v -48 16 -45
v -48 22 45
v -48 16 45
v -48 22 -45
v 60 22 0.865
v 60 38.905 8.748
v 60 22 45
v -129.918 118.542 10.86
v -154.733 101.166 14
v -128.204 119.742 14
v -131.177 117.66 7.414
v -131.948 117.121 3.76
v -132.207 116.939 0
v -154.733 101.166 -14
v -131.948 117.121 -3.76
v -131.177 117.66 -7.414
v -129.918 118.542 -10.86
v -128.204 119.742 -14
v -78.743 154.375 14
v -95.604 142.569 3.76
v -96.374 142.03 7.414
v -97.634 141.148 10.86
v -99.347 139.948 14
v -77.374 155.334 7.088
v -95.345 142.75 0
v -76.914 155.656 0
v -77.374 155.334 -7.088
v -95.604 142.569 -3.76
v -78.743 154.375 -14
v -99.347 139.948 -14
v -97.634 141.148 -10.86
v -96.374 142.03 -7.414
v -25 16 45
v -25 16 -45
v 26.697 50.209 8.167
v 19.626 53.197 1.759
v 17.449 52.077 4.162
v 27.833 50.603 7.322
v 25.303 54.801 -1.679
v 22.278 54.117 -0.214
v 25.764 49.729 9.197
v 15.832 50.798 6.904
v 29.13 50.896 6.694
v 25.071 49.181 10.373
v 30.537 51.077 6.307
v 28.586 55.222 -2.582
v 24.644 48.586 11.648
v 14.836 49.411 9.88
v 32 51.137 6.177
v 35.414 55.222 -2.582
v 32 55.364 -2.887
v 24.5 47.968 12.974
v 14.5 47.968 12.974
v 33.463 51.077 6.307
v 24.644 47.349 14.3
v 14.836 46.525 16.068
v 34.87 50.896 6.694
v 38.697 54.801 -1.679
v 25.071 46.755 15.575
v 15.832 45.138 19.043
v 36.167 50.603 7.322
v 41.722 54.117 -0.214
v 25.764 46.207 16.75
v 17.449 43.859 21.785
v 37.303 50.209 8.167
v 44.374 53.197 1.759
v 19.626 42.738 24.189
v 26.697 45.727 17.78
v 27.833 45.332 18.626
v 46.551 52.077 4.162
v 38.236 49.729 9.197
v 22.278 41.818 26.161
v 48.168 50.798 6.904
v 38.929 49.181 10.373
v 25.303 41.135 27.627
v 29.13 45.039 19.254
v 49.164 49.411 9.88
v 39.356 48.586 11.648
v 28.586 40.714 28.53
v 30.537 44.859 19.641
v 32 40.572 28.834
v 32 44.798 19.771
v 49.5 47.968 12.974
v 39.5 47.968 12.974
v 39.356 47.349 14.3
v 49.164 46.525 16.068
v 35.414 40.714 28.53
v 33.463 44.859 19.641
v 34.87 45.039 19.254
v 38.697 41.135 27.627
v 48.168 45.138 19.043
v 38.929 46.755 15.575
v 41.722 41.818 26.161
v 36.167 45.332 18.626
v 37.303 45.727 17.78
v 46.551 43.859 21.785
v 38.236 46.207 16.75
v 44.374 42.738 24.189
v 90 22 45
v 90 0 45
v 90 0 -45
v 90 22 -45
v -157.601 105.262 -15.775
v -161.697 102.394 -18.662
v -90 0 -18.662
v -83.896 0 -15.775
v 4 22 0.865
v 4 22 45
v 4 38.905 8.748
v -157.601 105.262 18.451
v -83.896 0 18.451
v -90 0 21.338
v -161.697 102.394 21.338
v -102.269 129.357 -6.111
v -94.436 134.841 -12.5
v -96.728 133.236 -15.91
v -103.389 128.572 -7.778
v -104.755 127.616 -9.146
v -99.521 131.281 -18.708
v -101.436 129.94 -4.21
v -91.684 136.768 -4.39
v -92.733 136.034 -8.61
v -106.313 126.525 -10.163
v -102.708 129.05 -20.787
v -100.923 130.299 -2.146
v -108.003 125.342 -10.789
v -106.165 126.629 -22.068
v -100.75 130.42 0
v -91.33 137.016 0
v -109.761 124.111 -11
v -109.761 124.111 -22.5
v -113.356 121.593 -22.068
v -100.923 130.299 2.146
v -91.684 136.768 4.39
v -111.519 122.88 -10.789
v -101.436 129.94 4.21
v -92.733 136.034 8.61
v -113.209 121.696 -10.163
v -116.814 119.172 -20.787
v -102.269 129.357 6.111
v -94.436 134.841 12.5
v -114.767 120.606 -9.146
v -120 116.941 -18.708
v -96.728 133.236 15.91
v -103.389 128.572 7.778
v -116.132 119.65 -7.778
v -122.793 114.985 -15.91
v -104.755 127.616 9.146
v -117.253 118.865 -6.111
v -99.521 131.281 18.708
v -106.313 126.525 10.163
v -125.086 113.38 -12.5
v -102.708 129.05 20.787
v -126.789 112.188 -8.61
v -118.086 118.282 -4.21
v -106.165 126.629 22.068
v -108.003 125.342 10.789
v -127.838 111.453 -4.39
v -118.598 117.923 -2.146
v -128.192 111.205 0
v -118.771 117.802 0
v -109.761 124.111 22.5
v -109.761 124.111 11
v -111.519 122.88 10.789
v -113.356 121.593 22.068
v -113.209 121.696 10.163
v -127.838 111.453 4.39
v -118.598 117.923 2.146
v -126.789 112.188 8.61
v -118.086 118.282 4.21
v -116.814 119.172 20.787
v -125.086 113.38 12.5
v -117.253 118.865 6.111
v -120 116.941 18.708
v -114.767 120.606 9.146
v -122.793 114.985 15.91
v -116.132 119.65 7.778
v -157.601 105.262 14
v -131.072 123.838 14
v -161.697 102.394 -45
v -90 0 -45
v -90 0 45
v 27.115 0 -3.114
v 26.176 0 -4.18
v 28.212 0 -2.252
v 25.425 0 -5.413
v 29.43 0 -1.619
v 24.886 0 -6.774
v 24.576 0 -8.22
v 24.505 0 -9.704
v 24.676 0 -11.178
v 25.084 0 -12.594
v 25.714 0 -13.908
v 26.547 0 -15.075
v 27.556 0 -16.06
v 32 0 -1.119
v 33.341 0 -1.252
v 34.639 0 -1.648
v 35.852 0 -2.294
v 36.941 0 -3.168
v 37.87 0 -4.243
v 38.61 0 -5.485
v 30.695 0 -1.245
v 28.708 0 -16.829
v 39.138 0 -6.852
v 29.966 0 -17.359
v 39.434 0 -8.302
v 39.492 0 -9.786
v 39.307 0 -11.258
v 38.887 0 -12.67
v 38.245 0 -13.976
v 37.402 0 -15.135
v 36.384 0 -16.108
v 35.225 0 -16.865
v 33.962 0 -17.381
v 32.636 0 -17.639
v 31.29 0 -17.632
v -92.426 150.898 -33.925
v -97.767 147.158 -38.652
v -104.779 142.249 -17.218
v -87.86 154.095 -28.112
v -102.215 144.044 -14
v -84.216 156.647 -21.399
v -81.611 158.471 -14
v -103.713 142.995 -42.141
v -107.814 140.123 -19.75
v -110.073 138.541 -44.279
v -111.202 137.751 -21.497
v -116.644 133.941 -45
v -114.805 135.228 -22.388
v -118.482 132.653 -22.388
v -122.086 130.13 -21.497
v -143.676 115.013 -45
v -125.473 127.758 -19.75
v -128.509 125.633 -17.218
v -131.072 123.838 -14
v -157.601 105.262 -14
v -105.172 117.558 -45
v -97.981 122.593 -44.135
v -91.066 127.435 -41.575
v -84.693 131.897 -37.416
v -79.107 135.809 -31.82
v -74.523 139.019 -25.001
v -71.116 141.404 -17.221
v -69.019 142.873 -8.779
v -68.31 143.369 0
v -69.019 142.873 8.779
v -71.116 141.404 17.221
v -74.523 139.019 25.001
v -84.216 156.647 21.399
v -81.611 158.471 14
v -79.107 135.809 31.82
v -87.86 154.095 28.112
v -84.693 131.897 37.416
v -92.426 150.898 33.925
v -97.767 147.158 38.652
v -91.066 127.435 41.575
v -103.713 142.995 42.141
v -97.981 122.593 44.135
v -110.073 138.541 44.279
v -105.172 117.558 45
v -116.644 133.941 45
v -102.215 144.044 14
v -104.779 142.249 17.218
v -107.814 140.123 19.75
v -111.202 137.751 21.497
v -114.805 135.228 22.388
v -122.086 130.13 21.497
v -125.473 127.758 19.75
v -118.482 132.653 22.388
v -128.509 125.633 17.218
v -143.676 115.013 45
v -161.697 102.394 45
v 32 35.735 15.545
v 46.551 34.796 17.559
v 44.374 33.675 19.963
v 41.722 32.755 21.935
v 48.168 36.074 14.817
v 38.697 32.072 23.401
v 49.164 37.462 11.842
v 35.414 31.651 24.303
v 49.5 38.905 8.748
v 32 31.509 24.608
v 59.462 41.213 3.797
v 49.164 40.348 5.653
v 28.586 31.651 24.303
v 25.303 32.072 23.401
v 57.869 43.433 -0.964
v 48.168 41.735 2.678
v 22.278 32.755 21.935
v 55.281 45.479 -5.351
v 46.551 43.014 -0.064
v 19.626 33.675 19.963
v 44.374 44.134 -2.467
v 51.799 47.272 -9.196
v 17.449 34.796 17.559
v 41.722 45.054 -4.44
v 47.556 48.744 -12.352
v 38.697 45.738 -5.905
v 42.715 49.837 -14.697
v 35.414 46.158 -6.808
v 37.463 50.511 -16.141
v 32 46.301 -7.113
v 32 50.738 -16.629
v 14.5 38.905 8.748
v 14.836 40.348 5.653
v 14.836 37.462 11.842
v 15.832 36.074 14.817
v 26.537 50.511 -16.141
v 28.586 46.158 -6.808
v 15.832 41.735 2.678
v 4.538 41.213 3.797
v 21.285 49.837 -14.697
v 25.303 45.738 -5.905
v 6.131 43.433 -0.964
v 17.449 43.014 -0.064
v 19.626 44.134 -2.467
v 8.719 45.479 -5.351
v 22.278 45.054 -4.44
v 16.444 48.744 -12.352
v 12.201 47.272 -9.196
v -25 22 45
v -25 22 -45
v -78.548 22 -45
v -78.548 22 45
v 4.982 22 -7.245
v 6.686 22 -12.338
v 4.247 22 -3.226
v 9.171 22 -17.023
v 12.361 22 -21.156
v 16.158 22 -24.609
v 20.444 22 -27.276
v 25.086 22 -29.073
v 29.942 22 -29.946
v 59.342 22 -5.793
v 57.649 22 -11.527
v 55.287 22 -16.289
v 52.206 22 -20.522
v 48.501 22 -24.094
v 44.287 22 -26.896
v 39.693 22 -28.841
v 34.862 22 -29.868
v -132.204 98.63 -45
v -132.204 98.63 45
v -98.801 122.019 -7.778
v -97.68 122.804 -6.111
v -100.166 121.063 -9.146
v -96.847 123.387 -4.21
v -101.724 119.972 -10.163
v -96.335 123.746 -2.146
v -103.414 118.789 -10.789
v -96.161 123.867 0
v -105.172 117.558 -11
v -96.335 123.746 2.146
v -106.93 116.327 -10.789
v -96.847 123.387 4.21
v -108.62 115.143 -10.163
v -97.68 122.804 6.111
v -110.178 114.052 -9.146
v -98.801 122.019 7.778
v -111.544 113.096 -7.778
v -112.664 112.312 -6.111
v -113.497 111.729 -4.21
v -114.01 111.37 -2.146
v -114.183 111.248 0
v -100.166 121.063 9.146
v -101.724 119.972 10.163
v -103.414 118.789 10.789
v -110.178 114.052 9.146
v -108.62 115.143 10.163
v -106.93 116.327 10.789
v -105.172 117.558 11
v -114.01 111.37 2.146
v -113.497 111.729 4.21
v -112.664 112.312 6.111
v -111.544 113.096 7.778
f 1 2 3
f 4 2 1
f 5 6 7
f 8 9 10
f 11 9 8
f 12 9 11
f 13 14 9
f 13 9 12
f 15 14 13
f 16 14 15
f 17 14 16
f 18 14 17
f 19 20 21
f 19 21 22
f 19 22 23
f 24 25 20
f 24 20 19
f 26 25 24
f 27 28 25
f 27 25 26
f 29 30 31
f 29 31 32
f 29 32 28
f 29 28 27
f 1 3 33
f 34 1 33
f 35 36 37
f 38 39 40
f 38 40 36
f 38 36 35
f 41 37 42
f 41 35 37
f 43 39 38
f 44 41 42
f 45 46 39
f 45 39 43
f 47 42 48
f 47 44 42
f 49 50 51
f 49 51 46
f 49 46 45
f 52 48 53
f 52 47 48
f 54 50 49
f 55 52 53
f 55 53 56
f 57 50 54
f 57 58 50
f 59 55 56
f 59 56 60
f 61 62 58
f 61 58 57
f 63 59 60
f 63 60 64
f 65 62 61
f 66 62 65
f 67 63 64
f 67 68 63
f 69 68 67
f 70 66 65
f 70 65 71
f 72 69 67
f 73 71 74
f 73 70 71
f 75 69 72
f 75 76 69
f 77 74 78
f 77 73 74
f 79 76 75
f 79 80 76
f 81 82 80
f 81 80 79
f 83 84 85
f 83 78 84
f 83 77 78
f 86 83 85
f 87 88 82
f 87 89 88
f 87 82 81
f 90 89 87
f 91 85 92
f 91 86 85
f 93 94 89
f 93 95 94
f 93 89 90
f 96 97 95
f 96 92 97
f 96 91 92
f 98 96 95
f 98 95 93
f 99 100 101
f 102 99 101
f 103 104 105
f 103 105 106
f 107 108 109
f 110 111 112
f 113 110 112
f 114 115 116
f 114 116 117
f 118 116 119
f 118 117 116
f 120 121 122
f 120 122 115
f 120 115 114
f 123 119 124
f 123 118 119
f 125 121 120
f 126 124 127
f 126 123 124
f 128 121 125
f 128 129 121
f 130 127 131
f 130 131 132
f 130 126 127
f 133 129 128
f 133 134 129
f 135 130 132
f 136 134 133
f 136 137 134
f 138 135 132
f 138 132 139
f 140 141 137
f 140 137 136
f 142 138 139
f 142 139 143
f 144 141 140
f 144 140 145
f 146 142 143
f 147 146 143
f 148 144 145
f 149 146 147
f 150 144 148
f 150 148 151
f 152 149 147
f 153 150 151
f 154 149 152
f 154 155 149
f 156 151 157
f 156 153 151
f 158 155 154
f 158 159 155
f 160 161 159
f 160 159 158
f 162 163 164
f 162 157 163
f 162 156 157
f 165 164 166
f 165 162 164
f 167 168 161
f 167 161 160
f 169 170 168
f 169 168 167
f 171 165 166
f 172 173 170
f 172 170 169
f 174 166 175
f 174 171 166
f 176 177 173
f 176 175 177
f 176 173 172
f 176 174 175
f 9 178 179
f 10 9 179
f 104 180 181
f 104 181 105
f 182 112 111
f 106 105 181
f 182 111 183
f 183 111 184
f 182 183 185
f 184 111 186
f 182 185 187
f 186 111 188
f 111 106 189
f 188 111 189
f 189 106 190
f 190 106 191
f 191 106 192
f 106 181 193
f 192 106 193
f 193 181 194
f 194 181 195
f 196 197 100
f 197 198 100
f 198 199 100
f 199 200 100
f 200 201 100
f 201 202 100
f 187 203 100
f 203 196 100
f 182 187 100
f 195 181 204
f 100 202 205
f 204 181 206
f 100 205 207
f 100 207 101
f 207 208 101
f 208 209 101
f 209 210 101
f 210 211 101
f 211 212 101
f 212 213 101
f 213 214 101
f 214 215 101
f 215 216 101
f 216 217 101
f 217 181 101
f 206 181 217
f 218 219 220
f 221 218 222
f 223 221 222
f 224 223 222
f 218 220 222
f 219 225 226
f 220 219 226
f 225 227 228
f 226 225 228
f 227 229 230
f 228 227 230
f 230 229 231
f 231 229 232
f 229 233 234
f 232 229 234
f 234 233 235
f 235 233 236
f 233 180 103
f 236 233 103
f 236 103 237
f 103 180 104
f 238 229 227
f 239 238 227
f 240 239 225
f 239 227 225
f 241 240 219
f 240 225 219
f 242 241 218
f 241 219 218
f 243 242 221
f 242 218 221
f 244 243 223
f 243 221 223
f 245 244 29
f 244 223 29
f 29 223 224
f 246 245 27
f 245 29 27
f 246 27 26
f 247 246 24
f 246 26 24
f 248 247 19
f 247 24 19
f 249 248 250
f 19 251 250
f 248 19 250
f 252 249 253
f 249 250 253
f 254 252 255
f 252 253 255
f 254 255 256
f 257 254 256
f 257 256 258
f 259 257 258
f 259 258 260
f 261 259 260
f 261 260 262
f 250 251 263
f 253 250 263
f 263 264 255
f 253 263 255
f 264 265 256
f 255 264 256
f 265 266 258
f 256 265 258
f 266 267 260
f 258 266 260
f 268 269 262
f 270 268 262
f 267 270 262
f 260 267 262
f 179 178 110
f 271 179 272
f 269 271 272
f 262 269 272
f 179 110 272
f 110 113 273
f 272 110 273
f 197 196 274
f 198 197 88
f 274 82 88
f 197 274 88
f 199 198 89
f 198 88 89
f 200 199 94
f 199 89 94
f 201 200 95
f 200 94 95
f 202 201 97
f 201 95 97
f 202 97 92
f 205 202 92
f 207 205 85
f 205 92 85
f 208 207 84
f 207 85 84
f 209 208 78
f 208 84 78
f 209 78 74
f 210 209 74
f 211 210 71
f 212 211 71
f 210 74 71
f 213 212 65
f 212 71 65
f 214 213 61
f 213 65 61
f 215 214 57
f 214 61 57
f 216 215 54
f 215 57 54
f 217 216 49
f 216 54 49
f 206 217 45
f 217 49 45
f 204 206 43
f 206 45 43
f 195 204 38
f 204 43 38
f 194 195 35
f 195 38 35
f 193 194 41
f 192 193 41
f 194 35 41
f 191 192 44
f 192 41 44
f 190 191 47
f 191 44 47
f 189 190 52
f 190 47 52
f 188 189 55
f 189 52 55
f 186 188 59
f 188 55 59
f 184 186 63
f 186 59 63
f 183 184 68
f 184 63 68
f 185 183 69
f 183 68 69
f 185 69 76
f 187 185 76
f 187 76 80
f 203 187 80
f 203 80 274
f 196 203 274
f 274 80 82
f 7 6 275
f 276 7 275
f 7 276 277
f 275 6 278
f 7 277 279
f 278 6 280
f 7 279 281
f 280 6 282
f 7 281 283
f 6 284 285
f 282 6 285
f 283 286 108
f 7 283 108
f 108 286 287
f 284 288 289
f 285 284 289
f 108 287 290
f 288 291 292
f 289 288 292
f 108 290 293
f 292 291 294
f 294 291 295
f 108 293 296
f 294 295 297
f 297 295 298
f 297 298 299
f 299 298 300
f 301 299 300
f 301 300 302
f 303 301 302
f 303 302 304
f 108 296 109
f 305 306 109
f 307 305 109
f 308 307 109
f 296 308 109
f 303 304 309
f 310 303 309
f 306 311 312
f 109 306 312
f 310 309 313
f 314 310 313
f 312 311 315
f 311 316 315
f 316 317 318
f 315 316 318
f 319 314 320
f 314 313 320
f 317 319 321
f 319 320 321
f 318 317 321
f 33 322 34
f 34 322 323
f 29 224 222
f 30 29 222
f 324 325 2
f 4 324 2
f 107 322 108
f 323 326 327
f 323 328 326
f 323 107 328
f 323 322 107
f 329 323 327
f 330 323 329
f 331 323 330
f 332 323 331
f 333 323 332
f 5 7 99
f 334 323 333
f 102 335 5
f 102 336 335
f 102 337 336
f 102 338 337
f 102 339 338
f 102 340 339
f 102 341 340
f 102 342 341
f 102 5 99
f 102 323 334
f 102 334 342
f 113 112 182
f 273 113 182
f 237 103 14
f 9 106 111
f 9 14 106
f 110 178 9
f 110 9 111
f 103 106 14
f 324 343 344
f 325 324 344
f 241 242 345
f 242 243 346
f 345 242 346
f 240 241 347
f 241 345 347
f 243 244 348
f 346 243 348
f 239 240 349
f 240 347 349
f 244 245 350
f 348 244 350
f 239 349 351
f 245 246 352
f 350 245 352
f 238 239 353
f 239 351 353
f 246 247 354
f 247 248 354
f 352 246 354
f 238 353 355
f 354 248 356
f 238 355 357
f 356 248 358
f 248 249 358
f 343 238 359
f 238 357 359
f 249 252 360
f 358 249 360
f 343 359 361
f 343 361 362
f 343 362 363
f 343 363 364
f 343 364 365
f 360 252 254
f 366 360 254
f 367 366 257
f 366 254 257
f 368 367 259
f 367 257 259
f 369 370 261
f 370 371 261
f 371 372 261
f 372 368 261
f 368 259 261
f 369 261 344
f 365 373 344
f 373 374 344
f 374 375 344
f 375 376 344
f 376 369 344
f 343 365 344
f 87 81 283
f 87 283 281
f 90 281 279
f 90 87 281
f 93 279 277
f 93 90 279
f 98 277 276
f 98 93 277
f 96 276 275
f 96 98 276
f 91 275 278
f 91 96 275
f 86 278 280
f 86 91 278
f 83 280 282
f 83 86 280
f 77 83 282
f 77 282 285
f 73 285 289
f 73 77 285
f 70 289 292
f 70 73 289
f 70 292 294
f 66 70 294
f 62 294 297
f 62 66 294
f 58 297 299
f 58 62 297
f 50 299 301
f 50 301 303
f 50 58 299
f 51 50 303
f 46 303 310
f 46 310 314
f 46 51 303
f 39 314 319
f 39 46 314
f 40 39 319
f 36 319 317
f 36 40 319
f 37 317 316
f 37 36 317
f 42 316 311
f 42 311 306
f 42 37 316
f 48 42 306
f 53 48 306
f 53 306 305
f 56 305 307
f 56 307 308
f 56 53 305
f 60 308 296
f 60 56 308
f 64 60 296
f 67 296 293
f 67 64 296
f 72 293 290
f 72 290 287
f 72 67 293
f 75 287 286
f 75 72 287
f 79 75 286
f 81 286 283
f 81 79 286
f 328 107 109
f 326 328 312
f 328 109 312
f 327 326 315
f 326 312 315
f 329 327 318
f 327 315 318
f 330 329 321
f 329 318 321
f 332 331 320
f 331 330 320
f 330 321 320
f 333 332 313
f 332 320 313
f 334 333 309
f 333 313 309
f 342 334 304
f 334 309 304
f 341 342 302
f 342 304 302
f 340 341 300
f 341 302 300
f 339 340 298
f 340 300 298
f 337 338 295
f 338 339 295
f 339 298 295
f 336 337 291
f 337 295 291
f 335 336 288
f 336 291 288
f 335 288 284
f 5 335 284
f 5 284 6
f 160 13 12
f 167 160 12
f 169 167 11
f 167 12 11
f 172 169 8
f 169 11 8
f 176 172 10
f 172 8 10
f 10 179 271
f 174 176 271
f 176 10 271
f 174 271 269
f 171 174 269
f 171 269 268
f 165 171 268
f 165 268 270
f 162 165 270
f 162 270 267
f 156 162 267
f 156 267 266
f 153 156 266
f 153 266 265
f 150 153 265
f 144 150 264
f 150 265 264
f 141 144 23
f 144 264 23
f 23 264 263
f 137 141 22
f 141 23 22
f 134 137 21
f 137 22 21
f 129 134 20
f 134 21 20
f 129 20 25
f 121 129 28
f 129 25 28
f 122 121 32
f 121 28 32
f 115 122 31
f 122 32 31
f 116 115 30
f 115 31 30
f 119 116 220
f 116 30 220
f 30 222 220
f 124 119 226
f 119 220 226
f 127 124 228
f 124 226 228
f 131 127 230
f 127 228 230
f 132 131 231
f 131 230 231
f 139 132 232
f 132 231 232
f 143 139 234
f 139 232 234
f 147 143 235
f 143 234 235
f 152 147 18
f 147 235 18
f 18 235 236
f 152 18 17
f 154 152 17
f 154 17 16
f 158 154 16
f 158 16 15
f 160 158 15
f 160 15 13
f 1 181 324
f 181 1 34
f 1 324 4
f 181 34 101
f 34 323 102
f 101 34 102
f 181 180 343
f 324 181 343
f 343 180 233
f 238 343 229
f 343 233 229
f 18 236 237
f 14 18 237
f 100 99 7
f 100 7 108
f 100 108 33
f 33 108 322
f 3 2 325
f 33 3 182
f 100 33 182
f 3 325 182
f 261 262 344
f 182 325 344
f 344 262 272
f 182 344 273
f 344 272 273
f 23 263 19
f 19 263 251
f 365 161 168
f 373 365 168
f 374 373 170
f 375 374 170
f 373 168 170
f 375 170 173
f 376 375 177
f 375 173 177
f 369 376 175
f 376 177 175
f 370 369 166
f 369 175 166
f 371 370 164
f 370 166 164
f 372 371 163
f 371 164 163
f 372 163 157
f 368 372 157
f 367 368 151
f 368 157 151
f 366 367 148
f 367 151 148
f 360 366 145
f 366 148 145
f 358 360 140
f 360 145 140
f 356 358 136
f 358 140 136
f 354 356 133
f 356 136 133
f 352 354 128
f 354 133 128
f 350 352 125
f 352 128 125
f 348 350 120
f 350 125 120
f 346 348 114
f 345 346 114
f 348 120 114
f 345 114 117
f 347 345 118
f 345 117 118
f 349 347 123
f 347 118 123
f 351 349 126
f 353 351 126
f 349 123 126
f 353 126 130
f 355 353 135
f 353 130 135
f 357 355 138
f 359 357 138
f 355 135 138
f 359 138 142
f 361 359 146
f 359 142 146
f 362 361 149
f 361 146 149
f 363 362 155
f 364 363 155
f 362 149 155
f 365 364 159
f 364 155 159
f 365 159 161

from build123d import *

# Parameters (mm, degrees)
SKETCH1_W           = 180
SKETCH1_H           = 90
BOSS_EXTRUDE1_DEPTH = 22
SKETCH2_W           = 23
SKETCH2_H           = 90
CUT_EXTRUDE1_DEPTH  = 6
BOSS_EXTRUDE2_REACH = 116.562
SKETCH4_R           = 17.5
SKETCH4_R_2         = 7.5
BOSS_EXTRUDE3_DEPTH = 10
SKETCH5_R           = 7.5
CUT_EXTRUDE2_DEPTH  = 115.561578352
SKETCH6_W           = 90
SKETCH6_H           = 125
BOSS_EXTRUDE4_DEPTH = 22
CUT_EXTRUDE3_DEPTH  = 245.0397404
SKETCH9_R           = 22.5
BOSS_EXTRUDE5_DEPTH = 20
BOSS_EXTRUDE6_START = -12
SKETCH9_3_R         = 22.5
SKETCH9_3_R_2       = 11
BOSS_EXTRUDE6_DEPTH = 8
CUT_EXTRUDE4_DEPTH  = 5


with BuildPart() as part:
    # Sketch1 → Boss-Extrude1 (new body)
    with BuildSketch(Plane(origin=(0, 0, 0), x_dir=(1, 0, 0), z_dir=(0, 1, 0))):
        Rectangle(SKETCH1_W, SKETCH1_H)
    extrude(amount=BOSS_EXTRUDE1_DEPTH)

    # Sketch2 → Cut-Extrude1 (cut)
    with BuildSketch(Plane(origin=(0, 22, 0), x_dir=(1, 0, 0), z_dir=(0, 1, 0))):
        with Locations((-36.5, 0)):
            Rectangle(SKETCH2_W, SKETCH2_H)
    extrude(amount=-CUT_EXTRUDE1_DEPTH, mode=Mode.SUBTRACT)

    # Boss-Extrude2: up to this face of the body (flat: up to its plane)
    boss_extrude2_end = Plane(part.part.faces().sort_by_distance((32.5, 22, 0))[0])
    # Sketch3 → Boss-Extrude2 (add, up to the picked face)
    with BuildSketch(Plane(origin=(0, 35.306663677, 16.463767656), x_dir=(1, 0, 0), z_dir=(0, 0.9063077870366496, 0.4226182617407003)), mode=Mode.PRIVATE) as boss_extrude2_sk1:
        with BuildLine():
            Line((4, -31.486248658), (4, 8.513751342))
            ThreePointArc((4, 8.513751342), (32, 36.513751342), (60, 8.513751342))
            Line((60, 8.513751342), (60, -31.486248658))
            Line((60, -31.486248658), (4, -31.486248658))
        make_face()
    boss_extrude2_tool1 = split(extrude(boss_extrude2_sk1.sketch, amount=-BOSS_EXTRUDE2_REACH, mode=Mode.PRIVATE), bisect_by=boss_extrude2_end, keep=Keep.BOTH, mode=Mode.PRIVATE)
    add(boss_extrude2_tool1.solids().sort_by(Axis((32, 35.232426, 16.622971), (0, -0.9063077870366496, -0.4226182617407003)))[0])

    # Sketch4 → Boss-Extrude3 (add)
    with BuildSketch(Plane(origin=(0, 44.369741547, 20.689950274), x_dir=(1, 0, 0), z_dir=(0, 0.9063077870366496, 0.4226182617407003))):
        with Locations(Location((32, 8.513751342, 0), (0, 0, 270))):
            Circle(SKETCH4_R)
        with Locations(Location((32, 8.513751342, 0), (0, 0, 270))):
            Circle(SKETCH4_R_2, mode=Mode.SUBTRACT)
    extrude(amount=-BOSS_EXTRUDE3_DEPTH)

    # Sketch5 → Cut-Extrude2 (cut, through all)
    with BuildSketch(Plane(origin=(0, 35.306663677, 16.463767656), x_dir=(1, 0, 0), z_dir=(0, 0.9063077870366496, 0.42261826174070033))):
        with Locations(Location((32, 8.513751342, 0), (0, 0, 270))):
            Circle(SKETCH5_R)
    extrude(amount=-CUT_EXTRUDE2_DEPTH, mode=Mode.SUBTRACT)

    # Sketch6 → Boss-Extrude4 (add)
    with BuildSketch(Plane(origin=(-60.39090645, -42.286167935, 0), x_dir=(0, 0, 1), z_dir=(-0.8191520442889891, -0.5735764363510502, 0))):
        with Locations((0, 114.121879272)):
            Rectangle(SKETCH6_W, SKETCH6_H)
    extrude(amount=-BOSS_EXTRUDE4_DEPTH)

    # Sketch8 → Cut-Extrude3 (cut, through all)
    with BuildSketch(Plane(origin=(-101.306148094, 144.680173471, 0), x_dir=(0.8191520442889889, 0.5735764363510504, 0), z_dir=(-0.5735764363510503, 0.8191520442889889, 0))):
        Polygon((-73.723683986, 18.662115607), (-68.723683986, 15.775364262), (-68.723683986, -18.451133047), (-73.723683986, -21.337884393), align=None)
    extrude(amount=-CUT_EXTRUDE3_DEPTH, mode=Mode.SUBTRACT)

    # Sketch9 → Boss-Extrude5 (add)
    with BuildSketch(Plane(origin=(-101.306148094, 144.680173471, 0), x_dir=(0, 0, -1), z_dir=(-0.5735764363510415, 0.819152044288995, 0))):
        with BuildLine():
            ThreePointArc((45, 18.723683986), (0, -26.276316014), (-45, 18.723683986))
            Line((-45, 18.723683986), (-45, 73.723683986))
            Line((-45, 73.723683986), (-21.337884393, 73.723683986))
            Line((-21.337884393, 73.723683986), (-18.451133047, 68.723683986))
            Line((-18.451133047, 68.723683986), (15.775364262, 68.723683986))
            Line((15.775364262, 68.723683986), (18.662115607, 73.723683986))
            Line((18.662115607, 73.723683986), (45, 73.723683986))
            Line((45, 73.723683986), (45, 18.723683986))
        make_face()
        with Locations(Location((0, 18.723683986, 0), (0, 0, 90))):
            Circle(SKETCH9_R, mode=Mode.SUBTRACT)
    extrude(amount=-BOSS_EXTRUDE5_DEPTH)

    # Sketch9<3> → Boss-Extrude6 (add)
    with BuildSketch(Plane(origin=(-101.306148094, 144.680173471, 0), x_dir=(0, 0, -1), z_dir=(-0.5735764363510415, 0.819152044288995, 0)).offset(BOSS_EXTRUDE6_START)):
        with Locations(Location((0, 18.723683986, 0), (0, 0, 90))):
            Circle(SKETCH9_3_R)
        with Locations(Location((0, 18.723683986, 0), (0, 0, 90))):
            Circle(SKETCH9_3_R_2, mode=Mode.SUBTRACT)
    extrude(amount=-BOSS_EXTRUDE6_DEPTH)

    # Sketch11 → Cut-Extrude4 (cut)
    with BuildSketch(Plane(origin=(-101.306148094, 144.680173471, 0), x_dir=(0.8191520442889889, 0.5735764363510504, 0), z_dir=(-0.5735764363510503, 0.8191520442889889, 0))):
        with BuildLine():
            Line((-36.33759894, 14), (-68.723683986, 14))
            Line((-68.723683986, 14), (-68.723683986, 0))
            Line((-68.723683986, 0), (-41.223683986, 0))
            ThreePointArc((-41.223683986, 0), (-39.96707221, 7.414071538), (-36.33759894, 14))
        make_face()
        with BuildLine():
            Line((-41.223683986, 0), (-68.723683986, 0))
            Line((-68.723683986, 0), (-68.723683986, -14))
            Line((-68.723683986, -14), (-36.33759894, -14))
            ThreePointArc((-36.33759894, -14), (-39.96707221, -7.414071538), (-41.223683986, 0))
        make_face()
        with BuildLine():
            Line((24.043125575, 14), (-1.109769032, 14))
            ThreePointArc((-1.109769032, 14), (2.519704238, 7.414071538), (3.776316014, 0))
            ThreePointArc((3.776316014, 0), (2.519704238, -7.414071538), (-1.109769032, -14))
            Line((-1.109769032, -14), (24.043125575, -14))
            ThreePointArc((24.043125575, -14), (26.276316014, 0), (24.043125575, 14))
        make_face()
    extrude(amount=-CUT_EXTRUDE4_DEPTH, mode=Mode.SUBTRACT)


solid = part.part
